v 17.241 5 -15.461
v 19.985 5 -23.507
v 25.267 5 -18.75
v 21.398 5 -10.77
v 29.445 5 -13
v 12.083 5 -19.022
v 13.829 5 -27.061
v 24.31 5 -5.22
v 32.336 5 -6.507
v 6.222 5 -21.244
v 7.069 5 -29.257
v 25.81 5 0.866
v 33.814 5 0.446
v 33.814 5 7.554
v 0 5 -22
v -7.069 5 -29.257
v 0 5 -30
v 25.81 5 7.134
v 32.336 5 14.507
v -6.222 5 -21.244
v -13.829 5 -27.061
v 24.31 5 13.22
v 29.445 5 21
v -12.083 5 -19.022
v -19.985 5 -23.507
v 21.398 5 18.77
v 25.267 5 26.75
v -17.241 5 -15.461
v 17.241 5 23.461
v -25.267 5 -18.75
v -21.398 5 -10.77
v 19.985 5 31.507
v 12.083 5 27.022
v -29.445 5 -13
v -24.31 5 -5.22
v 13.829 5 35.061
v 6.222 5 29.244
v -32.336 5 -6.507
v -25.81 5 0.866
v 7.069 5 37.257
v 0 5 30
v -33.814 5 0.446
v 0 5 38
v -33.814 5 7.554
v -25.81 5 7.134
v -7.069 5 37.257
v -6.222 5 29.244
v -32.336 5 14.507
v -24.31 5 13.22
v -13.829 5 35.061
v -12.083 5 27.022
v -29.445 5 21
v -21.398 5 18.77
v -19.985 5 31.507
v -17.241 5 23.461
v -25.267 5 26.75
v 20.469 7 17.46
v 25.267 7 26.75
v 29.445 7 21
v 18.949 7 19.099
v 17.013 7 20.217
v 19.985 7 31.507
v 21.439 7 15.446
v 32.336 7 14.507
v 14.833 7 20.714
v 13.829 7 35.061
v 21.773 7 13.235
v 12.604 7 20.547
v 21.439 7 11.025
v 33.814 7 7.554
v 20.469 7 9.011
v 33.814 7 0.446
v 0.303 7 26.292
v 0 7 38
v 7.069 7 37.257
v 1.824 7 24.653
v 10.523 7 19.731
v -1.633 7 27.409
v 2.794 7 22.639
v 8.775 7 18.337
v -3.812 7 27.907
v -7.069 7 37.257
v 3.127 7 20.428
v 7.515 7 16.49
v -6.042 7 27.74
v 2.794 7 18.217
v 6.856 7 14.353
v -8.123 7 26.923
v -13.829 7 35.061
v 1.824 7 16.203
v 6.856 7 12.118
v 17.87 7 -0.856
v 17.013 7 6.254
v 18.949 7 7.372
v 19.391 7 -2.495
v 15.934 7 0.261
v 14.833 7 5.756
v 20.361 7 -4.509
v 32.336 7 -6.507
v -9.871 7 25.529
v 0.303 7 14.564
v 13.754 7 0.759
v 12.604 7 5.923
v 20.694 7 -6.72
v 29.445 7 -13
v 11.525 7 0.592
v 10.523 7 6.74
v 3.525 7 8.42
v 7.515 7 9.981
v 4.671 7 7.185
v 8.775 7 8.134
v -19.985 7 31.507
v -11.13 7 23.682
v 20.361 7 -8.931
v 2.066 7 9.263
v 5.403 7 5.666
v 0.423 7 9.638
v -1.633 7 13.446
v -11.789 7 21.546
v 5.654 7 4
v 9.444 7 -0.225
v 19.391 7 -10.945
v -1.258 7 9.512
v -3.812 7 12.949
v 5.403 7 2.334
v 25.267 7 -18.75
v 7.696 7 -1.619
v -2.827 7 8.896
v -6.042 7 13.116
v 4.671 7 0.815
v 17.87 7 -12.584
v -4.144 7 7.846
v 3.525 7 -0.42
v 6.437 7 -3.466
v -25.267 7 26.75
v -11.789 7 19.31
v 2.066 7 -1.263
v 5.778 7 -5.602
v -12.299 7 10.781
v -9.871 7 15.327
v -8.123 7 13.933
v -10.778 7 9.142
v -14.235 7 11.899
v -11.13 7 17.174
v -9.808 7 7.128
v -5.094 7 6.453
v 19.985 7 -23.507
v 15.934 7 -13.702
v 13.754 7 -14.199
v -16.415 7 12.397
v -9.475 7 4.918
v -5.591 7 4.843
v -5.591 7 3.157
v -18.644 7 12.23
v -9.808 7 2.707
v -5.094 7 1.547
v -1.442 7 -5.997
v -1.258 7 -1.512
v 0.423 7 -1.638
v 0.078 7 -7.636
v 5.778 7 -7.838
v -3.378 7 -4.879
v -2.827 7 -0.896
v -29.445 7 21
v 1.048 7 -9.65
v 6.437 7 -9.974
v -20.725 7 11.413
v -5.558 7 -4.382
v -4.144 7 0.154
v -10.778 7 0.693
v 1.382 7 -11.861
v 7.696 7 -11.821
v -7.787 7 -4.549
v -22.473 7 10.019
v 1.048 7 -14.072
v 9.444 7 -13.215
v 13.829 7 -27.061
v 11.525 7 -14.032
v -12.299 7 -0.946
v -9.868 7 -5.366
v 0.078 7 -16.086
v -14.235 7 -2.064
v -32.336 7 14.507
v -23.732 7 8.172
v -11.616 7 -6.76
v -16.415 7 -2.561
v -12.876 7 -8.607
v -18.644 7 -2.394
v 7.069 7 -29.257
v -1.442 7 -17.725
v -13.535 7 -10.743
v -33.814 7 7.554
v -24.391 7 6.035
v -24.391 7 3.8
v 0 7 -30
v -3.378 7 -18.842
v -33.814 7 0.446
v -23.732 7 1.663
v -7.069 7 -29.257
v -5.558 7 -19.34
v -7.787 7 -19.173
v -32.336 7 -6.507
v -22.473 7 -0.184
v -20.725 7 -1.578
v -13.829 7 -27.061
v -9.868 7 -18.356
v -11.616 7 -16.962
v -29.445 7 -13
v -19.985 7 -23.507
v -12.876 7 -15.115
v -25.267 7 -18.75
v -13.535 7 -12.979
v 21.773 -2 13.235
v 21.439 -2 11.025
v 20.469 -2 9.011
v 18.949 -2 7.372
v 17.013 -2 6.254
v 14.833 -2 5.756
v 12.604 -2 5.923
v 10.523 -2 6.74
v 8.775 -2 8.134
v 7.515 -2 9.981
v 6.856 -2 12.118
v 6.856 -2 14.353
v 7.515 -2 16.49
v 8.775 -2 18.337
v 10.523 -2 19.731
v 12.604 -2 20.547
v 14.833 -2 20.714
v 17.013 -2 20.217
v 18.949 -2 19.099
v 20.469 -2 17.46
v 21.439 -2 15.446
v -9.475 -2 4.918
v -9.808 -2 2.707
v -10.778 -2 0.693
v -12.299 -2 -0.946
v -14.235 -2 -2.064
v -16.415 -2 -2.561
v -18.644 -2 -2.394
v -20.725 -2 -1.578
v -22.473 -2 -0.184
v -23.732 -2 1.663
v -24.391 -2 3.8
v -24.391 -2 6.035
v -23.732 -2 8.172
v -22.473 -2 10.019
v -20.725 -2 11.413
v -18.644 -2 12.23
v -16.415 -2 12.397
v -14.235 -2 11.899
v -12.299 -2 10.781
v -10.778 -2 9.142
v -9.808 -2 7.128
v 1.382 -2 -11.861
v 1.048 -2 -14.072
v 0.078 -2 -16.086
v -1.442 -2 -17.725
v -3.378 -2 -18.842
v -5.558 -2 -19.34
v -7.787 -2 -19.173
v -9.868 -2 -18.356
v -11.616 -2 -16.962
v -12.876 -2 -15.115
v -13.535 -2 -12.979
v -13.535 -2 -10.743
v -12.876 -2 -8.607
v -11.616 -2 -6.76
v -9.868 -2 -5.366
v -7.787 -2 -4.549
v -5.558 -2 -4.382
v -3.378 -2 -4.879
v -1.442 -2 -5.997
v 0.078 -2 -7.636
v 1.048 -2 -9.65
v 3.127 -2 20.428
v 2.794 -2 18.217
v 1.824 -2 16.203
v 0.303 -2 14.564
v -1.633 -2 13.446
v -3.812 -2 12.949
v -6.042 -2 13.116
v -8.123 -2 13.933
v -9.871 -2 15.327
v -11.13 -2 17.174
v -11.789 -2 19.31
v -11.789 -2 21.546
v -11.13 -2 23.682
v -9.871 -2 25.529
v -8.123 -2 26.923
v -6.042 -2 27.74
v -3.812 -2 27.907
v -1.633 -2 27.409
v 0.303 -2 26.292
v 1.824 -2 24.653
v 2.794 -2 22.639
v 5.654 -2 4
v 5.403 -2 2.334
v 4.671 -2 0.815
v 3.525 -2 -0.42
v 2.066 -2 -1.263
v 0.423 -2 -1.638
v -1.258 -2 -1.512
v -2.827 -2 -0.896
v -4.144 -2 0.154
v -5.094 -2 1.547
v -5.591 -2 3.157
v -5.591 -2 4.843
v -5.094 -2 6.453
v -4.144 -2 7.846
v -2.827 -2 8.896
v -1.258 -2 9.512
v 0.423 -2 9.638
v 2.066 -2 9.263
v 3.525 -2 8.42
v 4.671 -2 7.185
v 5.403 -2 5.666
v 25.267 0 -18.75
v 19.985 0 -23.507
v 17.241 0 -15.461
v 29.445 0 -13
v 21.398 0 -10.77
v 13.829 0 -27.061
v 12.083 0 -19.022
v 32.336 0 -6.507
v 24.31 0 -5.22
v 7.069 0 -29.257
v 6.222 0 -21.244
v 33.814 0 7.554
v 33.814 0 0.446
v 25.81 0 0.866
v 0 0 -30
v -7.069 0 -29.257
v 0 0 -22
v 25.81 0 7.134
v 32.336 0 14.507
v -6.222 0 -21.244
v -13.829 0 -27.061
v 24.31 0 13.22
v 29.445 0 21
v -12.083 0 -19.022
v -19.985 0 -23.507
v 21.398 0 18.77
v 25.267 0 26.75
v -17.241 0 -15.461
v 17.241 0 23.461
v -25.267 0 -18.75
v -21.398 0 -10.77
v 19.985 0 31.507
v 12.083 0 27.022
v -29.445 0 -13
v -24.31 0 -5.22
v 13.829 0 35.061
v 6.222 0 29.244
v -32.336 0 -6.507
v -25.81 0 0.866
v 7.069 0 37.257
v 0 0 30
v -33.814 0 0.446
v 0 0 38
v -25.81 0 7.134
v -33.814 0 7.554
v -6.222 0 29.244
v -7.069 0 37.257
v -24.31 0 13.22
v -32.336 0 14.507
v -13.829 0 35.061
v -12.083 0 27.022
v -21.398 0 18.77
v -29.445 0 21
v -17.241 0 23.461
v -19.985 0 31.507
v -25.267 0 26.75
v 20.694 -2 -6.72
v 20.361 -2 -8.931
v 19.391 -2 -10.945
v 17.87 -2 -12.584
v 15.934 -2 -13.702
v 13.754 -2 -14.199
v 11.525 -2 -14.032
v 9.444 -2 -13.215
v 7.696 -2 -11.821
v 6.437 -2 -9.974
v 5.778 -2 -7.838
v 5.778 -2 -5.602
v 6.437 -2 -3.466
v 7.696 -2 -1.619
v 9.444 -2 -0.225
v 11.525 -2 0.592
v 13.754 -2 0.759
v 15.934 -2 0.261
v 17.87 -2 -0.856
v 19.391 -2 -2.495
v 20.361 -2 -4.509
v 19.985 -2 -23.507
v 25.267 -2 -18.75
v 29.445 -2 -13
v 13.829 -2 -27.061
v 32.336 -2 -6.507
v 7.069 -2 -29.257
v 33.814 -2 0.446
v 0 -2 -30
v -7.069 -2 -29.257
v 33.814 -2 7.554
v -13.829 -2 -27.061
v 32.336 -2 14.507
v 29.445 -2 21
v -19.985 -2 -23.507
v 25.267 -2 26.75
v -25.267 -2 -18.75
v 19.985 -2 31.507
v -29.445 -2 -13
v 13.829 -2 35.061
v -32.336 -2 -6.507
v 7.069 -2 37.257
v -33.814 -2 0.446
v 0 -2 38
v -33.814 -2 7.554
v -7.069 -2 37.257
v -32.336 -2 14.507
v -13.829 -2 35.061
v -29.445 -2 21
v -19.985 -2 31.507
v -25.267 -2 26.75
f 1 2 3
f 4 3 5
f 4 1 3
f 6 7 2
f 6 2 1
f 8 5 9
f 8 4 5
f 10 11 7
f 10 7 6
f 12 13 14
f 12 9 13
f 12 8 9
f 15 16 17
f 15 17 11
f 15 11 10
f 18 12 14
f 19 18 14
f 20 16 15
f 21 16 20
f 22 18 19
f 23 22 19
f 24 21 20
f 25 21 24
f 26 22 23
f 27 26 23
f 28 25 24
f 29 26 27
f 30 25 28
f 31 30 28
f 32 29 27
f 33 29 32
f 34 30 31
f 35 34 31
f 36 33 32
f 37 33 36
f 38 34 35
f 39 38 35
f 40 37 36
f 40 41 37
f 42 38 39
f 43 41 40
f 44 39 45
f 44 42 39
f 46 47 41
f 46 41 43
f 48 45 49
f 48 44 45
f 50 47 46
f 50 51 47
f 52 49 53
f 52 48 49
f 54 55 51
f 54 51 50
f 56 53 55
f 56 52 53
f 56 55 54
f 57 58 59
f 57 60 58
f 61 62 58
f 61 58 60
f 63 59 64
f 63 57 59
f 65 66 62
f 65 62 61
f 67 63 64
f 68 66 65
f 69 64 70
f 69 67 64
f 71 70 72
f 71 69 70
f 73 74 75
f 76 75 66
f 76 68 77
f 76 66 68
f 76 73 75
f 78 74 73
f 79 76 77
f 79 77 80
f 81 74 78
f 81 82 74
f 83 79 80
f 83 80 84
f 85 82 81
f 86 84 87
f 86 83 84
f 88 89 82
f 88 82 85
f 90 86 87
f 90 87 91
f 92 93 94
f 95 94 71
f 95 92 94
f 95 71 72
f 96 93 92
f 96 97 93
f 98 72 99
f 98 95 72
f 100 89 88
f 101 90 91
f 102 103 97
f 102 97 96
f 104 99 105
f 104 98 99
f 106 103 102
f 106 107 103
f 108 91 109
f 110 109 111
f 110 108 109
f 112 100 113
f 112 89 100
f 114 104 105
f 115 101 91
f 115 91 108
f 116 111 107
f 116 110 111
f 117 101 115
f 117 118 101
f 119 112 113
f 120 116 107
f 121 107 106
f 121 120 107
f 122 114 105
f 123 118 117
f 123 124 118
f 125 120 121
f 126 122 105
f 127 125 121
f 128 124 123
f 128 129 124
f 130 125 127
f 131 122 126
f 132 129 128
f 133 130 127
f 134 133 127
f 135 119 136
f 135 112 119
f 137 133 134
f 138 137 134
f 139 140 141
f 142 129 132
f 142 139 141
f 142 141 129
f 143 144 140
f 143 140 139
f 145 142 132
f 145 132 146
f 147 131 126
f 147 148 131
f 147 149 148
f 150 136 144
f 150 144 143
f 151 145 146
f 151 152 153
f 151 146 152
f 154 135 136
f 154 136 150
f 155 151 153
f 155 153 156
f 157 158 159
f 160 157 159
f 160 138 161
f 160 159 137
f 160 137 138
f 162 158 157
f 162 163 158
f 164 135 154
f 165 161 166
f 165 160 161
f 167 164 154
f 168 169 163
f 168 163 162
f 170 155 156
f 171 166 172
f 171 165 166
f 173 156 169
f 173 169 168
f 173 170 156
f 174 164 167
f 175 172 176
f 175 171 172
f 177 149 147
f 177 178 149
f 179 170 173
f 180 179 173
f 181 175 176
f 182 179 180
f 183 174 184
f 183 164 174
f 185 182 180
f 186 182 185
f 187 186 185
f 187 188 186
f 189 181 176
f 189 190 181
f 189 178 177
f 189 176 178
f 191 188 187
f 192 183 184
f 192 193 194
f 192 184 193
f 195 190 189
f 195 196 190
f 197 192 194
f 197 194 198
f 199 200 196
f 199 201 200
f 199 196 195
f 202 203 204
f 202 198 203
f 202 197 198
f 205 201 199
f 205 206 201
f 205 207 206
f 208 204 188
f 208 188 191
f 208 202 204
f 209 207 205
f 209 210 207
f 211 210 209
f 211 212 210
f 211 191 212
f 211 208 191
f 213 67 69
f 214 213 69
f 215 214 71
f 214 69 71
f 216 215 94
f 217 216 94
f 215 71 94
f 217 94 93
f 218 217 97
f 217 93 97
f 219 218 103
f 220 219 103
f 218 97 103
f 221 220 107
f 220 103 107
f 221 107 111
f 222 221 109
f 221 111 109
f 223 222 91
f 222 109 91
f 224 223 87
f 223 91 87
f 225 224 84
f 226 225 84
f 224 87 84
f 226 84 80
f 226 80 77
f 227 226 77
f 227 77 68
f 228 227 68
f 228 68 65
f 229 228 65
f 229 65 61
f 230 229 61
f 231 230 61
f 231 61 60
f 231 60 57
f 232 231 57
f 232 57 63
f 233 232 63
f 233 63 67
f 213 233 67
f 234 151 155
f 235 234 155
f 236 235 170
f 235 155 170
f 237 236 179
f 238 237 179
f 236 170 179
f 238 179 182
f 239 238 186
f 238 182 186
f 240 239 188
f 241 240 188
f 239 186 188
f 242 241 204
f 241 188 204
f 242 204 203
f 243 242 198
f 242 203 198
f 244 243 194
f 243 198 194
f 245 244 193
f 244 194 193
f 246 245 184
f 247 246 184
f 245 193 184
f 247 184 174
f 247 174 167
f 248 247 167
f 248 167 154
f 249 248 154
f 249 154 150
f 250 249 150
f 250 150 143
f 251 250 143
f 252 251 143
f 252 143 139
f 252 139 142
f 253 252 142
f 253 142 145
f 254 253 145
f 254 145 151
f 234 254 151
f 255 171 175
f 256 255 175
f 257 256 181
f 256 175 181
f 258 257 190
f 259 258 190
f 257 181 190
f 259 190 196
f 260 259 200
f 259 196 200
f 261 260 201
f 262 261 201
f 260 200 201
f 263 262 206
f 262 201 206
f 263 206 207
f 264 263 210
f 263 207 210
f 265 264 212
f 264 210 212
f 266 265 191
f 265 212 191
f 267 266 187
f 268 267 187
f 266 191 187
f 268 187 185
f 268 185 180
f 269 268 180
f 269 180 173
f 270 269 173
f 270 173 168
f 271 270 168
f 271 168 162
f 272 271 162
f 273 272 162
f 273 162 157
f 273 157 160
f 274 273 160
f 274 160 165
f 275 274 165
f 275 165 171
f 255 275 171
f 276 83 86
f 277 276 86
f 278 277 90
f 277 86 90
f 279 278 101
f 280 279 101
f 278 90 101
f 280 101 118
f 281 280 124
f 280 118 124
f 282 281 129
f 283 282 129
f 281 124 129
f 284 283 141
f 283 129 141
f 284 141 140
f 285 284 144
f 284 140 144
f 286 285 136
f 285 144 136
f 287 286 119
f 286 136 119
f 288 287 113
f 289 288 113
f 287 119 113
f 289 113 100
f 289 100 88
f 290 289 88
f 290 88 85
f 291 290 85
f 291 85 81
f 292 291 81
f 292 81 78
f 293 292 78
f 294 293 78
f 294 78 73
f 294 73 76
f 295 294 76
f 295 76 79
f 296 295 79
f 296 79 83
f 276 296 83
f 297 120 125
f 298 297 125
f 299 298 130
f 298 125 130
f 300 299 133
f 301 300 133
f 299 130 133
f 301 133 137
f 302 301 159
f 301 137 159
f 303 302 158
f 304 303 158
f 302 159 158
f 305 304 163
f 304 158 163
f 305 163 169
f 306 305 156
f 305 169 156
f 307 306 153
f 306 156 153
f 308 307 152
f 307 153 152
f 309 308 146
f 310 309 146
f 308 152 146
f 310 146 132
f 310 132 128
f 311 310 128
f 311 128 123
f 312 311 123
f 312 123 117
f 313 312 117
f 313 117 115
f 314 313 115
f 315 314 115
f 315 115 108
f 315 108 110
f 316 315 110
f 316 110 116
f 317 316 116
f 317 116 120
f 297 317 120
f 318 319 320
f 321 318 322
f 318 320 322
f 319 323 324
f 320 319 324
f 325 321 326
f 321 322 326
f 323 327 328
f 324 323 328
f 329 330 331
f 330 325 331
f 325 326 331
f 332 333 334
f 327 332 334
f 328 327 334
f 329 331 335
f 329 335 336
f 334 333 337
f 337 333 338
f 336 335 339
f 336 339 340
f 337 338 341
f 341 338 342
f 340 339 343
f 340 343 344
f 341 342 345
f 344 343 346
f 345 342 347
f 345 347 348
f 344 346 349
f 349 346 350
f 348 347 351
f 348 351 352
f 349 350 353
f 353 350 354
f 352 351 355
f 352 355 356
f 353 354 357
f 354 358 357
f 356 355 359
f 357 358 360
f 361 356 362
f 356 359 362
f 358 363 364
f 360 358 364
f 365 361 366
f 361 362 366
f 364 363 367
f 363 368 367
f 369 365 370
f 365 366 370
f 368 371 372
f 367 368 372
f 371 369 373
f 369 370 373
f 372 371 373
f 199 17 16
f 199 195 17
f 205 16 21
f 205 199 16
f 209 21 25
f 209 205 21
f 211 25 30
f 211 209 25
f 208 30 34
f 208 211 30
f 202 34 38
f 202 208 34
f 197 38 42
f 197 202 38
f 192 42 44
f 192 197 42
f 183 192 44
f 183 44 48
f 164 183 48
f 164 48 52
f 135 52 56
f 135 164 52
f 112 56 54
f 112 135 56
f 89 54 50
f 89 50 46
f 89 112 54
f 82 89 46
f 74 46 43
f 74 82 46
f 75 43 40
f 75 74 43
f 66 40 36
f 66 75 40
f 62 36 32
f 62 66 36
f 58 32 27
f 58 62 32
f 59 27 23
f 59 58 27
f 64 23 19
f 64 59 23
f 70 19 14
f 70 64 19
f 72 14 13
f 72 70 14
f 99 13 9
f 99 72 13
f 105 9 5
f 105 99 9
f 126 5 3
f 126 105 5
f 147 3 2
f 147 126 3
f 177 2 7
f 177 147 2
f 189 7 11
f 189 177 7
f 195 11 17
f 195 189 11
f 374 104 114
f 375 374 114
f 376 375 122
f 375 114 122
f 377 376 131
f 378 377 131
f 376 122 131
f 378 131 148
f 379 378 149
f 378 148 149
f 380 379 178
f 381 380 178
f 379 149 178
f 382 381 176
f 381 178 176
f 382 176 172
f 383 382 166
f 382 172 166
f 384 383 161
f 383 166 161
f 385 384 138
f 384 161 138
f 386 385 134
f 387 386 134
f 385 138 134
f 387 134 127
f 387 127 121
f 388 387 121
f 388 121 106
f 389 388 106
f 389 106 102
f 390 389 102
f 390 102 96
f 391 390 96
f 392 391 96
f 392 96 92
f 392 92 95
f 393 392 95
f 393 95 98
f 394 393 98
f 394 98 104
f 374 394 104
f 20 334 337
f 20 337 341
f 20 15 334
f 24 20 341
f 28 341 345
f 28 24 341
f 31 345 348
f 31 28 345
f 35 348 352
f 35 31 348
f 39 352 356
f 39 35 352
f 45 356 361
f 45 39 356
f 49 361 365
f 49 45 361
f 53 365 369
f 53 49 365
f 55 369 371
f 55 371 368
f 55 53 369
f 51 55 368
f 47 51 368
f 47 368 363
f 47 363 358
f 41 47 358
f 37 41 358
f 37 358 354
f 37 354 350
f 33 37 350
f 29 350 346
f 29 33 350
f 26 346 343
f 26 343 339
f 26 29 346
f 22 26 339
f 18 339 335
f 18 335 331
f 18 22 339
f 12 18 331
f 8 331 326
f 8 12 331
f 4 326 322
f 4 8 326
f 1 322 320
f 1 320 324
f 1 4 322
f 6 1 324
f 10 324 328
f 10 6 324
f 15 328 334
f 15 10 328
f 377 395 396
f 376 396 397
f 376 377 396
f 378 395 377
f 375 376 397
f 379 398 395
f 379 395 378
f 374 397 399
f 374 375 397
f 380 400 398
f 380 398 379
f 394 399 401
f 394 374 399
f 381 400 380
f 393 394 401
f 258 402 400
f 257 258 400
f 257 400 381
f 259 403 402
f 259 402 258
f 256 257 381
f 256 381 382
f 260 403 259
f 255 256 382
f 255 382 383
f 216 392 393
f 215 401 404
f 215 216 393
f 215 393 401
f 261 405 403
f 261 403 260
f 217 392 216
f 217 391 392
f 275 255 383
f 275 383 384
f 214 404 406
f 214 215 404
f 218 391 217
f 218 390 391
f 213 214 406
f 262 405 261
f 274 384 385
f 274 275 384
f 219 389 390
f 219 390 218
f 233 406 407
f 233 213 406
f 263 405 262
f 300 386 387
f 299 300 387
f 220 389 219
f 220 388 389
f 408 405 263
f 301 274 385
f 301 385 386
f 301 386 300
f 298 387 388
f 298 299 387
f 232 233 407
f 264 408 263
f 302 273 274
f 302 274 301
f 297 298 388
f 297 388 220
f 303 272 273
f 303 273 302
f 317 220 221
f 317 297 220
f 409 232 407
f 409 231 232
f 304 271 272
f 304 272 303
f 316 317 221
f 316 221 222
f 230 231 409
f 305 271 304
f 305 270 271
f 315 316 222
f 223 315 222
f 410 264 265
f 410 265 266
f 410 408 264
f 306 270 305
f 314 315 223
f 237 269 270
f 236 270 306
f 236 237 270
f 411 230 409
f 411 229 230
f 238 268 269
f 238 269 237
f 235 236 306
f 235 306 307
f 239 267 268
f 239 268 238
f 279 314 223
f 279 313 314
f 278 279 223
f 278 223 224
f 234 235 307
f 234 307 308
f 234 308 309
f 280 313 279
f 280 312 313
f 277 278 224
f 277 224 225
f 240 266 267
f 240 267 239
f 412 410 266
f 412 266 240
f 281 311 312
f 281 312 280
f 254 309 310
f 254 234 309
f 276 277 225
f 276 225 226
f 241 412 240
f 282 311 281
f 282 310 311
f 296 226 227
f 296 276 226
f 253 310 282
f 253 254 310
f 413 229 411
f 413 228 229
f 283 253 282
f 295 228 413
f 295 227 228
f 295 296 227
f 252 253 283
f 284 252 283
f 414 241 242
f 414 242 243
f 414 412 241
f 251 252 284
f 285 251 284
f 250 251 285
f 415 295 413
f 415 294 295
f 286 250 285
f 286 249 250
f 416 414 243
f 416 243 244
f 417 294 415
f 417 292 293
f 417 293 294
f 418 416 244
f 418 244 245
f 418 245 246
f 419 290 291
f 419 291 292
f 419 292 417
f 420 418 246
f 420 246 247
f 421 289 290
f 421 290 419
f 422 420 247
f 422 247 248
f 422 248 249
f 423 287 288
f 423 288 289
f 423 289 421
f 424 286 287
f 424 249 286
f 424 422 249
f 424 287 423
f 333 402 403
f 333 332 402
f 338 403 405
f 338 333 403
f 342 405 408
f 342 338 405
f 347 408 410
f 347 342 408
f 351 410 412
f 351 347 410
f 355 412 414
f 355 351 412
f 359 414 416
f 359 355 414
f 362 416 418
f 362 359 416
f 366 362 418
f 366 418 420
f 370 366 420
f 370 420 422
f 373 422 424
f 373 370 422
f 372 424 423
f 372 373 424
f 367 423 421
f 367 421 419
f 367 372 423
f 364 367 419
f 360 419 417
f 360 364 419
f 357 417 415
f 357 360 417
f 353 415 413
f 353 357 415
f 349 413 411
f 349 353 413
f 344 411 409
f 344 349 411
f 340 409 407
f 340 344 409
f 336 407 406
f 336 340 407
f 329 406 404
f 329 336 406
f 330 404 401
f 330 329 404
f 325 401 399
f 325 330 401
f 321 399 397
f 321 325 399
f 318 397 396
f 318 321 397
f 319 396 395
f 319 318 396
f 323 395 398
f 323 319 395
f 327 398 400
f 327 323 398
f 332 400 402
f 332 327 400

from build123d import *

# Parameters (mm, degrees)
SKETCH1_W          = 22
SKETCH1_H          = 5
SKETCH1_W_2        = 30
SKETCH1_H_2        = 2
SKETCH3_R          = 5.653749864
SKETCH3_R_2        = 7.5
CUT_EXTRUDE1_DEPTH = 10


with BuildPart() as part:
    # Sketch1 → Revolve4 (revolve)
    with BuildSketch(Plane(origin=(0, 0, 0), x_dir=(0, 0, -1), z_dir=(1, 0, 0))):
        Polygon((0, 7), (0, 5), (22, 5), (30, 5), (30, 7), align=None)
        with Locations((11, 2.5)):
            Rectangle(SKETCH1_W, SKETCH1_H)
        with Locations((15, -1)):
            Rectangle(SKETCH1_W_2, SKETCH1_H_2)
    revolve(axis=Axis((0, 2.5, 4), (0, 1, 0)))

    # Sketch3 → Cut-Extrude1 (cut)
    with BuildSketch(Plane(origin=(0, 7, 0), x_dir=(1, 0, 0), z_dir=(0, 1, 0))):
        with Locations((0, -4)):
            Circle(SKETCH3_R)
        with Locations((-16.975218646, -4.917579386)):
            Circle(SKETCH3_R_2)
        with Locations((-6.118300899, 11.860844685)):
            Circle(SKETCH3_R_2)
        with Locations((13.193900737, 6.720120492)):
            Circle(SKETCH3_R_2)
        with Locations((14.272579999, -13.235445857)):
            Circle(SKETCH3_R_2)
        with Locations((-4.37296119, -20.427939933)):
            Circle(SKETCH3_R_2)
    extrude(amount=-CUT_EXTRUDE1_DEPTH, mode=Mode.SUBTRACT)


solid = part.part
